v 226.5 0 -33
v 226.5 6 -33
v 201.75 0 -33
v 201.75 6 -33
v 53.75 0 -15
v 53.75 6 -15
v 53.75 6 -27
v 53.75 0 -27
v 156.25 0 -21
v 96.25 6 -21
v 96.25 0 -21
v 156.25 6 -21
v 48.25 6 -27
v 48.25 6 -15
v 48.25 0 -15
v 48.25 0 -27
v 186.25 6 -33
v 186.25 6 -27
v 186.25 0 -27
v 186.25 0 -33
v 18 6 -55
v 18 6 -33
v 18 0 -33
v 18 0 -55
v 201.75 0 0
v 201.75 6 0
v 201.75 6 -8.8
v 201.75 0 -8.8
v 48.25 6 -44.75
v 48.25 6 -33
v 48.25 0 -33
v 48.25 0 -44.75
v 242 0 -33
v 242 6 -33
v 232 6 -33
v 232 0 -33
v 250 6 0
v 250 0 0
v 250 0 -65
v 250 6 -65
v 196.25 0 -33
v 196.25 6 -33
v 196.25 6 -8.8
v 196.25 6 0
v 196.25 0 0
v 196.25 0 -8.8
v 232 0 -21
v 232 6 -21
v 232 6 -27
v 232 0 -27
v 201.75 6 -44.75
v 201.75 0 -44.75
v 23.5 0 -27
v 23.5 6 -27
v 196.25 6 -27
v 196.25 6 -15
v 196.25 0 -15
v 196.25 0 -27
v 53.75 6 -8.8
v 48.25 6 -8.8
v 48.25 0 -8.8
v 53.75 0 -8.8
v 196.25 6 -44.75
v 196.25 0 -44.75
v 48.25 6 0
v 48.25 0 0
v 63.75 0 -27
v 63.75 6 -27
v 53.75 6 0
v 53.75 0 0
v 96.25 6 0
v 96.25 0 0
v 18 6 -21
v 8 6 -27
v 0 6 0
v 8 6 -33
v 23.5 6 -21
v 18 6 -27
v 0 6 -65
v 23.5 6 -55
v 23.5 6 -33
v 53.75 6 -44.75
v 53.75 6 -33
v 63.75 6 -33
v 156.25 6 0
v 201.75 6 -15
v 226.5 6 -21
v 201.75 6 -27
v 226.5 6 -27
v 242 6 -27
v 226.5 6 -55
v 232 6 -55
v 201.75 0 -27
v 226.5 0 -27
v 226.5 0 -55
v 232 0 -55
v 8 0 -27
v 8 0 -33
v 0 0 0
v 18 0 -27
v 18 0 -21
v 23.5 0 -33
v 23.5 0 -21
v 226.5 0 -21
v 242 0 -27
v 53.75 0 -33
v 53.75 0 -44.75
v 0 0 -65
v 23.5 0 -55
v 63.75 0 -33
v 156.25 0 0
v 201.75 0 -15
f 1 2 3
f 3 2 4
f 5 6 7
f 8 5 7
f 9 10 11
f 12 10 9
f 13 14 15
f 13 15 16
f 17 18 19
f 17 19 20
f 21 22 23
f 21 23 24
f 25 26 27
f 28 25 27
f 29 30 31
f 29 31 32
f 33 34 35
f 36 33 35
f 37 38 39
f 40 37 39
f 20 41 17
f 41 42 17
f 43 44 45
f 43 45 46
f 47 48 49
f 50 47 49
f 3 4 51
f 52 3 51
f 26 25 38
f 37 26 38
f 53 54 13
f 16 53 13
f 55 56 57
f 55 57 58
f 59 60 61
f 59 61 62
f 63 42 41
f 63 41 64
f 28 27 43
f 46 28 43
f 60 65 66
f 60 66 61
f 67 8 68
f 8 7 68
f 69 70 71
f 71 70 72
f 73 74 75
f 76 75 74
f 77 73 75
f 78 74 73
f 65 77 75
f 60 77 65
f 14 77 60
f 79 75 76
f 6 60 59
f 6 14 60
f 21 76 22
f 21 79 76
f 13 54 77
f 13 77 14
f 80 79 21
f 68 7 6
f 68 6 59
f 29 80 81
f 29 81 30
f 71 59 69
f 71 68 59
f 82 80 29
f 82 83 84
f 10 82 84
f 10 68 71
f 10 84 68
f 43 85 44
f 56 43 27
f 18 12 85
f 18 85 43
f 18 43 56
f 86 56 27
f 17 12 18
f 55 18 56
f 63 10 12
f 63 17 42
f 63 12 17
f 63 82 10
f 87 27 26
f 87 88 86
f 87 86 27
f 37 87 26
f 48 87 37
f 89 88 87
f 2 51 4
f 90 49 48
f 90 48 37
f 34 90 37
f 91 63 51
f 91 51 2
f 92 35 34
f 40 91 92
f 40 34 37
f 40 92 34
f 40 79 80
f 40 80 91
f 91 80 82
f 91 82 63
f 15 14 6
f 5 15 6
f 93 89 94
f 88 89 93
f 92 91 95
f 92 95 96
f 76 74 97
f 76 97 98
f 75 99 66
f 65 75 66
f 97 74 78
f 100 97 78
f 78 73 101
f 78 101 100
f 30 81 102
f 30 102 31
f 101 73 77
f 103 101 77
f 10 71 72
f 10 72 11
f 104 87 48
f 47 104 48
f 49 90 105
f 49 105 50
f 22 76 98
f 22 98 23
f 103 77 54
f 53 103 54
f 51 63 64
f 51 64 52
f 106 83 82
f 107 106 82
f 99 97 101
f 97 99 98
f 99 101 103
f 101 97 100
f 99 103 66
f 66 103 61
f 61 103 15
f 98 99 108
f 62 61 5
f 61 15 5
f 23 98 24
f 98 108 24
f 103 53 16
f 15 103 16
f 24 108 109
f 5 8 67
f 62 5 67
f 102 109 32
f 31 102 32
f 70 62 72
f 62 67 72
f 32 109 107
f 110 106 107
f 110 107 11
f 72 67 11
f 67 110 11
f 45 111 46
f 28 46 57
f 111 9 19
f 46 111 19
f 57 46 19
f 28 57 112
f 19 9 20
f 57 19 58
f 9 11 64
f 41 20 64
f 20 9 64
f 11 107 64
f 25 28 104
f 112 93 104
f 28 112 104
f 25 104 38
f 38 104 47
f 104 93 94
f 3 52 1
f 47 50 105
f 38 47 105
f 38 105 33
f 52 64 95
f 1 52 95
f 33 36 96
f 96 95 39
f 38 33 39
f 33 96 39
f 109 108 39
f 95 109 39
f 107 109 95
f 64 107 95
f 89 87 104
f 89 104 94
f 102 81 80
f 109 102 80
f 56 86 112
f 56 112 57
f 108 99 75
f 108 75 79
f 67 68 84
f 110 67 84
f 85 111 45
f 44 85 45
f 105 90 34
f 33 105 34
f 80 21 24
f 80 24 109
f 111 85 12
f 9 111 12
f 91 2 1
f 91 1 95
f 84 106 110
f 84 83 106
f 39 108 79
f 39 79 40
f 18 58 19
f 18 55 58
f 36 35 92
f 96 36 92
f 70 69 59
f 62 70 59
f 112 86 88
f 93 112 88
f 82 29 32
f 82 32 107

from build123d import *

# Parameters (mm, degrees)
SKETCH1_W           = 250
SKETCH1_H           = 65
BOSS_EXTRUDE1_DEPTH = 6
SKETCH2_W           = 5.5
SKETCH2_H           = 34
SKETCH2_H_2         = 47.5
CUT_EXTRUDE1_DEPTH  = 259.381500886
SKETCH3_W           = 60
SKETCH3_H           = 21
CUT_EXTRUDE2_DEPTH  = 259.381500886
SKETCH4_W           = 55.75
SKETCH4_H           = 6
CUT_EXTRUDE3_DEPTH  = 259.381500886
SKETCH5_W           = 5.5
SKETCH5_H           = 6.2
BOSS_EXTRUDE2_DEPTH = 6


with BuildPart() as part:
    # Sketch1 → Boss-Extrude1 (new body)
    with BuildSketch(Plane(origin=(0, 0, 0), x_dir=(1, 0, 0), z_dir=(0, 1, 0))):
        with Locations((125, 32.5)):
            Rectangle(SKETCH1_W, SKETCH1_H)
    extrude(amount=BOSS_EXTRUDE1_DEPTH)

    # Sketch2 → Cut-Extrude1 (cut, through all)
    with BuildSketch(Plane(origin=(0, 6, 0), x_dir=(1, 0, 0), z_dir=(0, 1, 0))):
        with Locations((20.75, 38)):
            Rectangle(SKETCH2_W, SKETCH2_H)
        with Locations((51, 21)):
            Rectangle(SKETCH2_W, SKETCH2_H_2)
        with Locations((199, 21)):
            Rectangle(SKETCH2_W, SKETCH2_H_2)
        with Locations((229.25, 38)):
            Rectangle(SKETCH2_W, SKETCH2_H)
    extrude(amount=-CUT_EXTRUDE1_DEPTH, mode=Mode.SUBTRACT)

    # Sketch3 → Cut-Extrude2 (cut, through all)
    with BuildSketch(Plane(origin=(0, 6, 0), x_dir=(1, 0, 0), z_dir=(0, 1, 0))):
        with Locations((126.25, 10.5)):
            Rectangle(SKETCH3_W, SKETCH3_H)
    extrude(amount=-CUT_EXTRUDE2_DEPTH, mode=Mode.SUBTRACT)

    # Sketch4 → Cut-Extrude3 (cut, through all)
    with BuildSketch(Plane(origin=(0, 6, 0), x_dir=(1, 0, 0), z_dir=(0, 1, 0))):
        with Locations((35.875, 30)):
            Rectangle(SKETCH4_W, SKETCH4_H)
    cut_extrude3 = extrude(amount=-CUT_EXTRUDE3_DEPTH, mode=Mode.SUBTRACT)

    # Sketch5 → Boss-Extrude2 (add)
    with BuildSketch(Plane(origin=(0, 6, 0), x_dir=(1, 0, 0), z_dir=(0, 1, 0))):
        with Locations((51, 11.9)):
            Rectangle(SKETCH5_W, SKETCH5_H)
    boss_extrude2 = extrude(amount=-BOSS_EXTRUDE2_DEPTH)

    # Mirror1: Cut-Extrude3, Boss-Extrude2 across plane
    add(cut_extrude3.mirror(Plane(origin=(125, 0, 0), x_dir=(0, 0, 1), z_dir=(1, 0, 0))), mode=Mode.SUBTRACT)
    add(boss_extrude2.mirror(Plane(origin=(125, 0, 0), x_dir=(0, 0, 1), z_dir=(1, 0, 0))))


solid = part.part
